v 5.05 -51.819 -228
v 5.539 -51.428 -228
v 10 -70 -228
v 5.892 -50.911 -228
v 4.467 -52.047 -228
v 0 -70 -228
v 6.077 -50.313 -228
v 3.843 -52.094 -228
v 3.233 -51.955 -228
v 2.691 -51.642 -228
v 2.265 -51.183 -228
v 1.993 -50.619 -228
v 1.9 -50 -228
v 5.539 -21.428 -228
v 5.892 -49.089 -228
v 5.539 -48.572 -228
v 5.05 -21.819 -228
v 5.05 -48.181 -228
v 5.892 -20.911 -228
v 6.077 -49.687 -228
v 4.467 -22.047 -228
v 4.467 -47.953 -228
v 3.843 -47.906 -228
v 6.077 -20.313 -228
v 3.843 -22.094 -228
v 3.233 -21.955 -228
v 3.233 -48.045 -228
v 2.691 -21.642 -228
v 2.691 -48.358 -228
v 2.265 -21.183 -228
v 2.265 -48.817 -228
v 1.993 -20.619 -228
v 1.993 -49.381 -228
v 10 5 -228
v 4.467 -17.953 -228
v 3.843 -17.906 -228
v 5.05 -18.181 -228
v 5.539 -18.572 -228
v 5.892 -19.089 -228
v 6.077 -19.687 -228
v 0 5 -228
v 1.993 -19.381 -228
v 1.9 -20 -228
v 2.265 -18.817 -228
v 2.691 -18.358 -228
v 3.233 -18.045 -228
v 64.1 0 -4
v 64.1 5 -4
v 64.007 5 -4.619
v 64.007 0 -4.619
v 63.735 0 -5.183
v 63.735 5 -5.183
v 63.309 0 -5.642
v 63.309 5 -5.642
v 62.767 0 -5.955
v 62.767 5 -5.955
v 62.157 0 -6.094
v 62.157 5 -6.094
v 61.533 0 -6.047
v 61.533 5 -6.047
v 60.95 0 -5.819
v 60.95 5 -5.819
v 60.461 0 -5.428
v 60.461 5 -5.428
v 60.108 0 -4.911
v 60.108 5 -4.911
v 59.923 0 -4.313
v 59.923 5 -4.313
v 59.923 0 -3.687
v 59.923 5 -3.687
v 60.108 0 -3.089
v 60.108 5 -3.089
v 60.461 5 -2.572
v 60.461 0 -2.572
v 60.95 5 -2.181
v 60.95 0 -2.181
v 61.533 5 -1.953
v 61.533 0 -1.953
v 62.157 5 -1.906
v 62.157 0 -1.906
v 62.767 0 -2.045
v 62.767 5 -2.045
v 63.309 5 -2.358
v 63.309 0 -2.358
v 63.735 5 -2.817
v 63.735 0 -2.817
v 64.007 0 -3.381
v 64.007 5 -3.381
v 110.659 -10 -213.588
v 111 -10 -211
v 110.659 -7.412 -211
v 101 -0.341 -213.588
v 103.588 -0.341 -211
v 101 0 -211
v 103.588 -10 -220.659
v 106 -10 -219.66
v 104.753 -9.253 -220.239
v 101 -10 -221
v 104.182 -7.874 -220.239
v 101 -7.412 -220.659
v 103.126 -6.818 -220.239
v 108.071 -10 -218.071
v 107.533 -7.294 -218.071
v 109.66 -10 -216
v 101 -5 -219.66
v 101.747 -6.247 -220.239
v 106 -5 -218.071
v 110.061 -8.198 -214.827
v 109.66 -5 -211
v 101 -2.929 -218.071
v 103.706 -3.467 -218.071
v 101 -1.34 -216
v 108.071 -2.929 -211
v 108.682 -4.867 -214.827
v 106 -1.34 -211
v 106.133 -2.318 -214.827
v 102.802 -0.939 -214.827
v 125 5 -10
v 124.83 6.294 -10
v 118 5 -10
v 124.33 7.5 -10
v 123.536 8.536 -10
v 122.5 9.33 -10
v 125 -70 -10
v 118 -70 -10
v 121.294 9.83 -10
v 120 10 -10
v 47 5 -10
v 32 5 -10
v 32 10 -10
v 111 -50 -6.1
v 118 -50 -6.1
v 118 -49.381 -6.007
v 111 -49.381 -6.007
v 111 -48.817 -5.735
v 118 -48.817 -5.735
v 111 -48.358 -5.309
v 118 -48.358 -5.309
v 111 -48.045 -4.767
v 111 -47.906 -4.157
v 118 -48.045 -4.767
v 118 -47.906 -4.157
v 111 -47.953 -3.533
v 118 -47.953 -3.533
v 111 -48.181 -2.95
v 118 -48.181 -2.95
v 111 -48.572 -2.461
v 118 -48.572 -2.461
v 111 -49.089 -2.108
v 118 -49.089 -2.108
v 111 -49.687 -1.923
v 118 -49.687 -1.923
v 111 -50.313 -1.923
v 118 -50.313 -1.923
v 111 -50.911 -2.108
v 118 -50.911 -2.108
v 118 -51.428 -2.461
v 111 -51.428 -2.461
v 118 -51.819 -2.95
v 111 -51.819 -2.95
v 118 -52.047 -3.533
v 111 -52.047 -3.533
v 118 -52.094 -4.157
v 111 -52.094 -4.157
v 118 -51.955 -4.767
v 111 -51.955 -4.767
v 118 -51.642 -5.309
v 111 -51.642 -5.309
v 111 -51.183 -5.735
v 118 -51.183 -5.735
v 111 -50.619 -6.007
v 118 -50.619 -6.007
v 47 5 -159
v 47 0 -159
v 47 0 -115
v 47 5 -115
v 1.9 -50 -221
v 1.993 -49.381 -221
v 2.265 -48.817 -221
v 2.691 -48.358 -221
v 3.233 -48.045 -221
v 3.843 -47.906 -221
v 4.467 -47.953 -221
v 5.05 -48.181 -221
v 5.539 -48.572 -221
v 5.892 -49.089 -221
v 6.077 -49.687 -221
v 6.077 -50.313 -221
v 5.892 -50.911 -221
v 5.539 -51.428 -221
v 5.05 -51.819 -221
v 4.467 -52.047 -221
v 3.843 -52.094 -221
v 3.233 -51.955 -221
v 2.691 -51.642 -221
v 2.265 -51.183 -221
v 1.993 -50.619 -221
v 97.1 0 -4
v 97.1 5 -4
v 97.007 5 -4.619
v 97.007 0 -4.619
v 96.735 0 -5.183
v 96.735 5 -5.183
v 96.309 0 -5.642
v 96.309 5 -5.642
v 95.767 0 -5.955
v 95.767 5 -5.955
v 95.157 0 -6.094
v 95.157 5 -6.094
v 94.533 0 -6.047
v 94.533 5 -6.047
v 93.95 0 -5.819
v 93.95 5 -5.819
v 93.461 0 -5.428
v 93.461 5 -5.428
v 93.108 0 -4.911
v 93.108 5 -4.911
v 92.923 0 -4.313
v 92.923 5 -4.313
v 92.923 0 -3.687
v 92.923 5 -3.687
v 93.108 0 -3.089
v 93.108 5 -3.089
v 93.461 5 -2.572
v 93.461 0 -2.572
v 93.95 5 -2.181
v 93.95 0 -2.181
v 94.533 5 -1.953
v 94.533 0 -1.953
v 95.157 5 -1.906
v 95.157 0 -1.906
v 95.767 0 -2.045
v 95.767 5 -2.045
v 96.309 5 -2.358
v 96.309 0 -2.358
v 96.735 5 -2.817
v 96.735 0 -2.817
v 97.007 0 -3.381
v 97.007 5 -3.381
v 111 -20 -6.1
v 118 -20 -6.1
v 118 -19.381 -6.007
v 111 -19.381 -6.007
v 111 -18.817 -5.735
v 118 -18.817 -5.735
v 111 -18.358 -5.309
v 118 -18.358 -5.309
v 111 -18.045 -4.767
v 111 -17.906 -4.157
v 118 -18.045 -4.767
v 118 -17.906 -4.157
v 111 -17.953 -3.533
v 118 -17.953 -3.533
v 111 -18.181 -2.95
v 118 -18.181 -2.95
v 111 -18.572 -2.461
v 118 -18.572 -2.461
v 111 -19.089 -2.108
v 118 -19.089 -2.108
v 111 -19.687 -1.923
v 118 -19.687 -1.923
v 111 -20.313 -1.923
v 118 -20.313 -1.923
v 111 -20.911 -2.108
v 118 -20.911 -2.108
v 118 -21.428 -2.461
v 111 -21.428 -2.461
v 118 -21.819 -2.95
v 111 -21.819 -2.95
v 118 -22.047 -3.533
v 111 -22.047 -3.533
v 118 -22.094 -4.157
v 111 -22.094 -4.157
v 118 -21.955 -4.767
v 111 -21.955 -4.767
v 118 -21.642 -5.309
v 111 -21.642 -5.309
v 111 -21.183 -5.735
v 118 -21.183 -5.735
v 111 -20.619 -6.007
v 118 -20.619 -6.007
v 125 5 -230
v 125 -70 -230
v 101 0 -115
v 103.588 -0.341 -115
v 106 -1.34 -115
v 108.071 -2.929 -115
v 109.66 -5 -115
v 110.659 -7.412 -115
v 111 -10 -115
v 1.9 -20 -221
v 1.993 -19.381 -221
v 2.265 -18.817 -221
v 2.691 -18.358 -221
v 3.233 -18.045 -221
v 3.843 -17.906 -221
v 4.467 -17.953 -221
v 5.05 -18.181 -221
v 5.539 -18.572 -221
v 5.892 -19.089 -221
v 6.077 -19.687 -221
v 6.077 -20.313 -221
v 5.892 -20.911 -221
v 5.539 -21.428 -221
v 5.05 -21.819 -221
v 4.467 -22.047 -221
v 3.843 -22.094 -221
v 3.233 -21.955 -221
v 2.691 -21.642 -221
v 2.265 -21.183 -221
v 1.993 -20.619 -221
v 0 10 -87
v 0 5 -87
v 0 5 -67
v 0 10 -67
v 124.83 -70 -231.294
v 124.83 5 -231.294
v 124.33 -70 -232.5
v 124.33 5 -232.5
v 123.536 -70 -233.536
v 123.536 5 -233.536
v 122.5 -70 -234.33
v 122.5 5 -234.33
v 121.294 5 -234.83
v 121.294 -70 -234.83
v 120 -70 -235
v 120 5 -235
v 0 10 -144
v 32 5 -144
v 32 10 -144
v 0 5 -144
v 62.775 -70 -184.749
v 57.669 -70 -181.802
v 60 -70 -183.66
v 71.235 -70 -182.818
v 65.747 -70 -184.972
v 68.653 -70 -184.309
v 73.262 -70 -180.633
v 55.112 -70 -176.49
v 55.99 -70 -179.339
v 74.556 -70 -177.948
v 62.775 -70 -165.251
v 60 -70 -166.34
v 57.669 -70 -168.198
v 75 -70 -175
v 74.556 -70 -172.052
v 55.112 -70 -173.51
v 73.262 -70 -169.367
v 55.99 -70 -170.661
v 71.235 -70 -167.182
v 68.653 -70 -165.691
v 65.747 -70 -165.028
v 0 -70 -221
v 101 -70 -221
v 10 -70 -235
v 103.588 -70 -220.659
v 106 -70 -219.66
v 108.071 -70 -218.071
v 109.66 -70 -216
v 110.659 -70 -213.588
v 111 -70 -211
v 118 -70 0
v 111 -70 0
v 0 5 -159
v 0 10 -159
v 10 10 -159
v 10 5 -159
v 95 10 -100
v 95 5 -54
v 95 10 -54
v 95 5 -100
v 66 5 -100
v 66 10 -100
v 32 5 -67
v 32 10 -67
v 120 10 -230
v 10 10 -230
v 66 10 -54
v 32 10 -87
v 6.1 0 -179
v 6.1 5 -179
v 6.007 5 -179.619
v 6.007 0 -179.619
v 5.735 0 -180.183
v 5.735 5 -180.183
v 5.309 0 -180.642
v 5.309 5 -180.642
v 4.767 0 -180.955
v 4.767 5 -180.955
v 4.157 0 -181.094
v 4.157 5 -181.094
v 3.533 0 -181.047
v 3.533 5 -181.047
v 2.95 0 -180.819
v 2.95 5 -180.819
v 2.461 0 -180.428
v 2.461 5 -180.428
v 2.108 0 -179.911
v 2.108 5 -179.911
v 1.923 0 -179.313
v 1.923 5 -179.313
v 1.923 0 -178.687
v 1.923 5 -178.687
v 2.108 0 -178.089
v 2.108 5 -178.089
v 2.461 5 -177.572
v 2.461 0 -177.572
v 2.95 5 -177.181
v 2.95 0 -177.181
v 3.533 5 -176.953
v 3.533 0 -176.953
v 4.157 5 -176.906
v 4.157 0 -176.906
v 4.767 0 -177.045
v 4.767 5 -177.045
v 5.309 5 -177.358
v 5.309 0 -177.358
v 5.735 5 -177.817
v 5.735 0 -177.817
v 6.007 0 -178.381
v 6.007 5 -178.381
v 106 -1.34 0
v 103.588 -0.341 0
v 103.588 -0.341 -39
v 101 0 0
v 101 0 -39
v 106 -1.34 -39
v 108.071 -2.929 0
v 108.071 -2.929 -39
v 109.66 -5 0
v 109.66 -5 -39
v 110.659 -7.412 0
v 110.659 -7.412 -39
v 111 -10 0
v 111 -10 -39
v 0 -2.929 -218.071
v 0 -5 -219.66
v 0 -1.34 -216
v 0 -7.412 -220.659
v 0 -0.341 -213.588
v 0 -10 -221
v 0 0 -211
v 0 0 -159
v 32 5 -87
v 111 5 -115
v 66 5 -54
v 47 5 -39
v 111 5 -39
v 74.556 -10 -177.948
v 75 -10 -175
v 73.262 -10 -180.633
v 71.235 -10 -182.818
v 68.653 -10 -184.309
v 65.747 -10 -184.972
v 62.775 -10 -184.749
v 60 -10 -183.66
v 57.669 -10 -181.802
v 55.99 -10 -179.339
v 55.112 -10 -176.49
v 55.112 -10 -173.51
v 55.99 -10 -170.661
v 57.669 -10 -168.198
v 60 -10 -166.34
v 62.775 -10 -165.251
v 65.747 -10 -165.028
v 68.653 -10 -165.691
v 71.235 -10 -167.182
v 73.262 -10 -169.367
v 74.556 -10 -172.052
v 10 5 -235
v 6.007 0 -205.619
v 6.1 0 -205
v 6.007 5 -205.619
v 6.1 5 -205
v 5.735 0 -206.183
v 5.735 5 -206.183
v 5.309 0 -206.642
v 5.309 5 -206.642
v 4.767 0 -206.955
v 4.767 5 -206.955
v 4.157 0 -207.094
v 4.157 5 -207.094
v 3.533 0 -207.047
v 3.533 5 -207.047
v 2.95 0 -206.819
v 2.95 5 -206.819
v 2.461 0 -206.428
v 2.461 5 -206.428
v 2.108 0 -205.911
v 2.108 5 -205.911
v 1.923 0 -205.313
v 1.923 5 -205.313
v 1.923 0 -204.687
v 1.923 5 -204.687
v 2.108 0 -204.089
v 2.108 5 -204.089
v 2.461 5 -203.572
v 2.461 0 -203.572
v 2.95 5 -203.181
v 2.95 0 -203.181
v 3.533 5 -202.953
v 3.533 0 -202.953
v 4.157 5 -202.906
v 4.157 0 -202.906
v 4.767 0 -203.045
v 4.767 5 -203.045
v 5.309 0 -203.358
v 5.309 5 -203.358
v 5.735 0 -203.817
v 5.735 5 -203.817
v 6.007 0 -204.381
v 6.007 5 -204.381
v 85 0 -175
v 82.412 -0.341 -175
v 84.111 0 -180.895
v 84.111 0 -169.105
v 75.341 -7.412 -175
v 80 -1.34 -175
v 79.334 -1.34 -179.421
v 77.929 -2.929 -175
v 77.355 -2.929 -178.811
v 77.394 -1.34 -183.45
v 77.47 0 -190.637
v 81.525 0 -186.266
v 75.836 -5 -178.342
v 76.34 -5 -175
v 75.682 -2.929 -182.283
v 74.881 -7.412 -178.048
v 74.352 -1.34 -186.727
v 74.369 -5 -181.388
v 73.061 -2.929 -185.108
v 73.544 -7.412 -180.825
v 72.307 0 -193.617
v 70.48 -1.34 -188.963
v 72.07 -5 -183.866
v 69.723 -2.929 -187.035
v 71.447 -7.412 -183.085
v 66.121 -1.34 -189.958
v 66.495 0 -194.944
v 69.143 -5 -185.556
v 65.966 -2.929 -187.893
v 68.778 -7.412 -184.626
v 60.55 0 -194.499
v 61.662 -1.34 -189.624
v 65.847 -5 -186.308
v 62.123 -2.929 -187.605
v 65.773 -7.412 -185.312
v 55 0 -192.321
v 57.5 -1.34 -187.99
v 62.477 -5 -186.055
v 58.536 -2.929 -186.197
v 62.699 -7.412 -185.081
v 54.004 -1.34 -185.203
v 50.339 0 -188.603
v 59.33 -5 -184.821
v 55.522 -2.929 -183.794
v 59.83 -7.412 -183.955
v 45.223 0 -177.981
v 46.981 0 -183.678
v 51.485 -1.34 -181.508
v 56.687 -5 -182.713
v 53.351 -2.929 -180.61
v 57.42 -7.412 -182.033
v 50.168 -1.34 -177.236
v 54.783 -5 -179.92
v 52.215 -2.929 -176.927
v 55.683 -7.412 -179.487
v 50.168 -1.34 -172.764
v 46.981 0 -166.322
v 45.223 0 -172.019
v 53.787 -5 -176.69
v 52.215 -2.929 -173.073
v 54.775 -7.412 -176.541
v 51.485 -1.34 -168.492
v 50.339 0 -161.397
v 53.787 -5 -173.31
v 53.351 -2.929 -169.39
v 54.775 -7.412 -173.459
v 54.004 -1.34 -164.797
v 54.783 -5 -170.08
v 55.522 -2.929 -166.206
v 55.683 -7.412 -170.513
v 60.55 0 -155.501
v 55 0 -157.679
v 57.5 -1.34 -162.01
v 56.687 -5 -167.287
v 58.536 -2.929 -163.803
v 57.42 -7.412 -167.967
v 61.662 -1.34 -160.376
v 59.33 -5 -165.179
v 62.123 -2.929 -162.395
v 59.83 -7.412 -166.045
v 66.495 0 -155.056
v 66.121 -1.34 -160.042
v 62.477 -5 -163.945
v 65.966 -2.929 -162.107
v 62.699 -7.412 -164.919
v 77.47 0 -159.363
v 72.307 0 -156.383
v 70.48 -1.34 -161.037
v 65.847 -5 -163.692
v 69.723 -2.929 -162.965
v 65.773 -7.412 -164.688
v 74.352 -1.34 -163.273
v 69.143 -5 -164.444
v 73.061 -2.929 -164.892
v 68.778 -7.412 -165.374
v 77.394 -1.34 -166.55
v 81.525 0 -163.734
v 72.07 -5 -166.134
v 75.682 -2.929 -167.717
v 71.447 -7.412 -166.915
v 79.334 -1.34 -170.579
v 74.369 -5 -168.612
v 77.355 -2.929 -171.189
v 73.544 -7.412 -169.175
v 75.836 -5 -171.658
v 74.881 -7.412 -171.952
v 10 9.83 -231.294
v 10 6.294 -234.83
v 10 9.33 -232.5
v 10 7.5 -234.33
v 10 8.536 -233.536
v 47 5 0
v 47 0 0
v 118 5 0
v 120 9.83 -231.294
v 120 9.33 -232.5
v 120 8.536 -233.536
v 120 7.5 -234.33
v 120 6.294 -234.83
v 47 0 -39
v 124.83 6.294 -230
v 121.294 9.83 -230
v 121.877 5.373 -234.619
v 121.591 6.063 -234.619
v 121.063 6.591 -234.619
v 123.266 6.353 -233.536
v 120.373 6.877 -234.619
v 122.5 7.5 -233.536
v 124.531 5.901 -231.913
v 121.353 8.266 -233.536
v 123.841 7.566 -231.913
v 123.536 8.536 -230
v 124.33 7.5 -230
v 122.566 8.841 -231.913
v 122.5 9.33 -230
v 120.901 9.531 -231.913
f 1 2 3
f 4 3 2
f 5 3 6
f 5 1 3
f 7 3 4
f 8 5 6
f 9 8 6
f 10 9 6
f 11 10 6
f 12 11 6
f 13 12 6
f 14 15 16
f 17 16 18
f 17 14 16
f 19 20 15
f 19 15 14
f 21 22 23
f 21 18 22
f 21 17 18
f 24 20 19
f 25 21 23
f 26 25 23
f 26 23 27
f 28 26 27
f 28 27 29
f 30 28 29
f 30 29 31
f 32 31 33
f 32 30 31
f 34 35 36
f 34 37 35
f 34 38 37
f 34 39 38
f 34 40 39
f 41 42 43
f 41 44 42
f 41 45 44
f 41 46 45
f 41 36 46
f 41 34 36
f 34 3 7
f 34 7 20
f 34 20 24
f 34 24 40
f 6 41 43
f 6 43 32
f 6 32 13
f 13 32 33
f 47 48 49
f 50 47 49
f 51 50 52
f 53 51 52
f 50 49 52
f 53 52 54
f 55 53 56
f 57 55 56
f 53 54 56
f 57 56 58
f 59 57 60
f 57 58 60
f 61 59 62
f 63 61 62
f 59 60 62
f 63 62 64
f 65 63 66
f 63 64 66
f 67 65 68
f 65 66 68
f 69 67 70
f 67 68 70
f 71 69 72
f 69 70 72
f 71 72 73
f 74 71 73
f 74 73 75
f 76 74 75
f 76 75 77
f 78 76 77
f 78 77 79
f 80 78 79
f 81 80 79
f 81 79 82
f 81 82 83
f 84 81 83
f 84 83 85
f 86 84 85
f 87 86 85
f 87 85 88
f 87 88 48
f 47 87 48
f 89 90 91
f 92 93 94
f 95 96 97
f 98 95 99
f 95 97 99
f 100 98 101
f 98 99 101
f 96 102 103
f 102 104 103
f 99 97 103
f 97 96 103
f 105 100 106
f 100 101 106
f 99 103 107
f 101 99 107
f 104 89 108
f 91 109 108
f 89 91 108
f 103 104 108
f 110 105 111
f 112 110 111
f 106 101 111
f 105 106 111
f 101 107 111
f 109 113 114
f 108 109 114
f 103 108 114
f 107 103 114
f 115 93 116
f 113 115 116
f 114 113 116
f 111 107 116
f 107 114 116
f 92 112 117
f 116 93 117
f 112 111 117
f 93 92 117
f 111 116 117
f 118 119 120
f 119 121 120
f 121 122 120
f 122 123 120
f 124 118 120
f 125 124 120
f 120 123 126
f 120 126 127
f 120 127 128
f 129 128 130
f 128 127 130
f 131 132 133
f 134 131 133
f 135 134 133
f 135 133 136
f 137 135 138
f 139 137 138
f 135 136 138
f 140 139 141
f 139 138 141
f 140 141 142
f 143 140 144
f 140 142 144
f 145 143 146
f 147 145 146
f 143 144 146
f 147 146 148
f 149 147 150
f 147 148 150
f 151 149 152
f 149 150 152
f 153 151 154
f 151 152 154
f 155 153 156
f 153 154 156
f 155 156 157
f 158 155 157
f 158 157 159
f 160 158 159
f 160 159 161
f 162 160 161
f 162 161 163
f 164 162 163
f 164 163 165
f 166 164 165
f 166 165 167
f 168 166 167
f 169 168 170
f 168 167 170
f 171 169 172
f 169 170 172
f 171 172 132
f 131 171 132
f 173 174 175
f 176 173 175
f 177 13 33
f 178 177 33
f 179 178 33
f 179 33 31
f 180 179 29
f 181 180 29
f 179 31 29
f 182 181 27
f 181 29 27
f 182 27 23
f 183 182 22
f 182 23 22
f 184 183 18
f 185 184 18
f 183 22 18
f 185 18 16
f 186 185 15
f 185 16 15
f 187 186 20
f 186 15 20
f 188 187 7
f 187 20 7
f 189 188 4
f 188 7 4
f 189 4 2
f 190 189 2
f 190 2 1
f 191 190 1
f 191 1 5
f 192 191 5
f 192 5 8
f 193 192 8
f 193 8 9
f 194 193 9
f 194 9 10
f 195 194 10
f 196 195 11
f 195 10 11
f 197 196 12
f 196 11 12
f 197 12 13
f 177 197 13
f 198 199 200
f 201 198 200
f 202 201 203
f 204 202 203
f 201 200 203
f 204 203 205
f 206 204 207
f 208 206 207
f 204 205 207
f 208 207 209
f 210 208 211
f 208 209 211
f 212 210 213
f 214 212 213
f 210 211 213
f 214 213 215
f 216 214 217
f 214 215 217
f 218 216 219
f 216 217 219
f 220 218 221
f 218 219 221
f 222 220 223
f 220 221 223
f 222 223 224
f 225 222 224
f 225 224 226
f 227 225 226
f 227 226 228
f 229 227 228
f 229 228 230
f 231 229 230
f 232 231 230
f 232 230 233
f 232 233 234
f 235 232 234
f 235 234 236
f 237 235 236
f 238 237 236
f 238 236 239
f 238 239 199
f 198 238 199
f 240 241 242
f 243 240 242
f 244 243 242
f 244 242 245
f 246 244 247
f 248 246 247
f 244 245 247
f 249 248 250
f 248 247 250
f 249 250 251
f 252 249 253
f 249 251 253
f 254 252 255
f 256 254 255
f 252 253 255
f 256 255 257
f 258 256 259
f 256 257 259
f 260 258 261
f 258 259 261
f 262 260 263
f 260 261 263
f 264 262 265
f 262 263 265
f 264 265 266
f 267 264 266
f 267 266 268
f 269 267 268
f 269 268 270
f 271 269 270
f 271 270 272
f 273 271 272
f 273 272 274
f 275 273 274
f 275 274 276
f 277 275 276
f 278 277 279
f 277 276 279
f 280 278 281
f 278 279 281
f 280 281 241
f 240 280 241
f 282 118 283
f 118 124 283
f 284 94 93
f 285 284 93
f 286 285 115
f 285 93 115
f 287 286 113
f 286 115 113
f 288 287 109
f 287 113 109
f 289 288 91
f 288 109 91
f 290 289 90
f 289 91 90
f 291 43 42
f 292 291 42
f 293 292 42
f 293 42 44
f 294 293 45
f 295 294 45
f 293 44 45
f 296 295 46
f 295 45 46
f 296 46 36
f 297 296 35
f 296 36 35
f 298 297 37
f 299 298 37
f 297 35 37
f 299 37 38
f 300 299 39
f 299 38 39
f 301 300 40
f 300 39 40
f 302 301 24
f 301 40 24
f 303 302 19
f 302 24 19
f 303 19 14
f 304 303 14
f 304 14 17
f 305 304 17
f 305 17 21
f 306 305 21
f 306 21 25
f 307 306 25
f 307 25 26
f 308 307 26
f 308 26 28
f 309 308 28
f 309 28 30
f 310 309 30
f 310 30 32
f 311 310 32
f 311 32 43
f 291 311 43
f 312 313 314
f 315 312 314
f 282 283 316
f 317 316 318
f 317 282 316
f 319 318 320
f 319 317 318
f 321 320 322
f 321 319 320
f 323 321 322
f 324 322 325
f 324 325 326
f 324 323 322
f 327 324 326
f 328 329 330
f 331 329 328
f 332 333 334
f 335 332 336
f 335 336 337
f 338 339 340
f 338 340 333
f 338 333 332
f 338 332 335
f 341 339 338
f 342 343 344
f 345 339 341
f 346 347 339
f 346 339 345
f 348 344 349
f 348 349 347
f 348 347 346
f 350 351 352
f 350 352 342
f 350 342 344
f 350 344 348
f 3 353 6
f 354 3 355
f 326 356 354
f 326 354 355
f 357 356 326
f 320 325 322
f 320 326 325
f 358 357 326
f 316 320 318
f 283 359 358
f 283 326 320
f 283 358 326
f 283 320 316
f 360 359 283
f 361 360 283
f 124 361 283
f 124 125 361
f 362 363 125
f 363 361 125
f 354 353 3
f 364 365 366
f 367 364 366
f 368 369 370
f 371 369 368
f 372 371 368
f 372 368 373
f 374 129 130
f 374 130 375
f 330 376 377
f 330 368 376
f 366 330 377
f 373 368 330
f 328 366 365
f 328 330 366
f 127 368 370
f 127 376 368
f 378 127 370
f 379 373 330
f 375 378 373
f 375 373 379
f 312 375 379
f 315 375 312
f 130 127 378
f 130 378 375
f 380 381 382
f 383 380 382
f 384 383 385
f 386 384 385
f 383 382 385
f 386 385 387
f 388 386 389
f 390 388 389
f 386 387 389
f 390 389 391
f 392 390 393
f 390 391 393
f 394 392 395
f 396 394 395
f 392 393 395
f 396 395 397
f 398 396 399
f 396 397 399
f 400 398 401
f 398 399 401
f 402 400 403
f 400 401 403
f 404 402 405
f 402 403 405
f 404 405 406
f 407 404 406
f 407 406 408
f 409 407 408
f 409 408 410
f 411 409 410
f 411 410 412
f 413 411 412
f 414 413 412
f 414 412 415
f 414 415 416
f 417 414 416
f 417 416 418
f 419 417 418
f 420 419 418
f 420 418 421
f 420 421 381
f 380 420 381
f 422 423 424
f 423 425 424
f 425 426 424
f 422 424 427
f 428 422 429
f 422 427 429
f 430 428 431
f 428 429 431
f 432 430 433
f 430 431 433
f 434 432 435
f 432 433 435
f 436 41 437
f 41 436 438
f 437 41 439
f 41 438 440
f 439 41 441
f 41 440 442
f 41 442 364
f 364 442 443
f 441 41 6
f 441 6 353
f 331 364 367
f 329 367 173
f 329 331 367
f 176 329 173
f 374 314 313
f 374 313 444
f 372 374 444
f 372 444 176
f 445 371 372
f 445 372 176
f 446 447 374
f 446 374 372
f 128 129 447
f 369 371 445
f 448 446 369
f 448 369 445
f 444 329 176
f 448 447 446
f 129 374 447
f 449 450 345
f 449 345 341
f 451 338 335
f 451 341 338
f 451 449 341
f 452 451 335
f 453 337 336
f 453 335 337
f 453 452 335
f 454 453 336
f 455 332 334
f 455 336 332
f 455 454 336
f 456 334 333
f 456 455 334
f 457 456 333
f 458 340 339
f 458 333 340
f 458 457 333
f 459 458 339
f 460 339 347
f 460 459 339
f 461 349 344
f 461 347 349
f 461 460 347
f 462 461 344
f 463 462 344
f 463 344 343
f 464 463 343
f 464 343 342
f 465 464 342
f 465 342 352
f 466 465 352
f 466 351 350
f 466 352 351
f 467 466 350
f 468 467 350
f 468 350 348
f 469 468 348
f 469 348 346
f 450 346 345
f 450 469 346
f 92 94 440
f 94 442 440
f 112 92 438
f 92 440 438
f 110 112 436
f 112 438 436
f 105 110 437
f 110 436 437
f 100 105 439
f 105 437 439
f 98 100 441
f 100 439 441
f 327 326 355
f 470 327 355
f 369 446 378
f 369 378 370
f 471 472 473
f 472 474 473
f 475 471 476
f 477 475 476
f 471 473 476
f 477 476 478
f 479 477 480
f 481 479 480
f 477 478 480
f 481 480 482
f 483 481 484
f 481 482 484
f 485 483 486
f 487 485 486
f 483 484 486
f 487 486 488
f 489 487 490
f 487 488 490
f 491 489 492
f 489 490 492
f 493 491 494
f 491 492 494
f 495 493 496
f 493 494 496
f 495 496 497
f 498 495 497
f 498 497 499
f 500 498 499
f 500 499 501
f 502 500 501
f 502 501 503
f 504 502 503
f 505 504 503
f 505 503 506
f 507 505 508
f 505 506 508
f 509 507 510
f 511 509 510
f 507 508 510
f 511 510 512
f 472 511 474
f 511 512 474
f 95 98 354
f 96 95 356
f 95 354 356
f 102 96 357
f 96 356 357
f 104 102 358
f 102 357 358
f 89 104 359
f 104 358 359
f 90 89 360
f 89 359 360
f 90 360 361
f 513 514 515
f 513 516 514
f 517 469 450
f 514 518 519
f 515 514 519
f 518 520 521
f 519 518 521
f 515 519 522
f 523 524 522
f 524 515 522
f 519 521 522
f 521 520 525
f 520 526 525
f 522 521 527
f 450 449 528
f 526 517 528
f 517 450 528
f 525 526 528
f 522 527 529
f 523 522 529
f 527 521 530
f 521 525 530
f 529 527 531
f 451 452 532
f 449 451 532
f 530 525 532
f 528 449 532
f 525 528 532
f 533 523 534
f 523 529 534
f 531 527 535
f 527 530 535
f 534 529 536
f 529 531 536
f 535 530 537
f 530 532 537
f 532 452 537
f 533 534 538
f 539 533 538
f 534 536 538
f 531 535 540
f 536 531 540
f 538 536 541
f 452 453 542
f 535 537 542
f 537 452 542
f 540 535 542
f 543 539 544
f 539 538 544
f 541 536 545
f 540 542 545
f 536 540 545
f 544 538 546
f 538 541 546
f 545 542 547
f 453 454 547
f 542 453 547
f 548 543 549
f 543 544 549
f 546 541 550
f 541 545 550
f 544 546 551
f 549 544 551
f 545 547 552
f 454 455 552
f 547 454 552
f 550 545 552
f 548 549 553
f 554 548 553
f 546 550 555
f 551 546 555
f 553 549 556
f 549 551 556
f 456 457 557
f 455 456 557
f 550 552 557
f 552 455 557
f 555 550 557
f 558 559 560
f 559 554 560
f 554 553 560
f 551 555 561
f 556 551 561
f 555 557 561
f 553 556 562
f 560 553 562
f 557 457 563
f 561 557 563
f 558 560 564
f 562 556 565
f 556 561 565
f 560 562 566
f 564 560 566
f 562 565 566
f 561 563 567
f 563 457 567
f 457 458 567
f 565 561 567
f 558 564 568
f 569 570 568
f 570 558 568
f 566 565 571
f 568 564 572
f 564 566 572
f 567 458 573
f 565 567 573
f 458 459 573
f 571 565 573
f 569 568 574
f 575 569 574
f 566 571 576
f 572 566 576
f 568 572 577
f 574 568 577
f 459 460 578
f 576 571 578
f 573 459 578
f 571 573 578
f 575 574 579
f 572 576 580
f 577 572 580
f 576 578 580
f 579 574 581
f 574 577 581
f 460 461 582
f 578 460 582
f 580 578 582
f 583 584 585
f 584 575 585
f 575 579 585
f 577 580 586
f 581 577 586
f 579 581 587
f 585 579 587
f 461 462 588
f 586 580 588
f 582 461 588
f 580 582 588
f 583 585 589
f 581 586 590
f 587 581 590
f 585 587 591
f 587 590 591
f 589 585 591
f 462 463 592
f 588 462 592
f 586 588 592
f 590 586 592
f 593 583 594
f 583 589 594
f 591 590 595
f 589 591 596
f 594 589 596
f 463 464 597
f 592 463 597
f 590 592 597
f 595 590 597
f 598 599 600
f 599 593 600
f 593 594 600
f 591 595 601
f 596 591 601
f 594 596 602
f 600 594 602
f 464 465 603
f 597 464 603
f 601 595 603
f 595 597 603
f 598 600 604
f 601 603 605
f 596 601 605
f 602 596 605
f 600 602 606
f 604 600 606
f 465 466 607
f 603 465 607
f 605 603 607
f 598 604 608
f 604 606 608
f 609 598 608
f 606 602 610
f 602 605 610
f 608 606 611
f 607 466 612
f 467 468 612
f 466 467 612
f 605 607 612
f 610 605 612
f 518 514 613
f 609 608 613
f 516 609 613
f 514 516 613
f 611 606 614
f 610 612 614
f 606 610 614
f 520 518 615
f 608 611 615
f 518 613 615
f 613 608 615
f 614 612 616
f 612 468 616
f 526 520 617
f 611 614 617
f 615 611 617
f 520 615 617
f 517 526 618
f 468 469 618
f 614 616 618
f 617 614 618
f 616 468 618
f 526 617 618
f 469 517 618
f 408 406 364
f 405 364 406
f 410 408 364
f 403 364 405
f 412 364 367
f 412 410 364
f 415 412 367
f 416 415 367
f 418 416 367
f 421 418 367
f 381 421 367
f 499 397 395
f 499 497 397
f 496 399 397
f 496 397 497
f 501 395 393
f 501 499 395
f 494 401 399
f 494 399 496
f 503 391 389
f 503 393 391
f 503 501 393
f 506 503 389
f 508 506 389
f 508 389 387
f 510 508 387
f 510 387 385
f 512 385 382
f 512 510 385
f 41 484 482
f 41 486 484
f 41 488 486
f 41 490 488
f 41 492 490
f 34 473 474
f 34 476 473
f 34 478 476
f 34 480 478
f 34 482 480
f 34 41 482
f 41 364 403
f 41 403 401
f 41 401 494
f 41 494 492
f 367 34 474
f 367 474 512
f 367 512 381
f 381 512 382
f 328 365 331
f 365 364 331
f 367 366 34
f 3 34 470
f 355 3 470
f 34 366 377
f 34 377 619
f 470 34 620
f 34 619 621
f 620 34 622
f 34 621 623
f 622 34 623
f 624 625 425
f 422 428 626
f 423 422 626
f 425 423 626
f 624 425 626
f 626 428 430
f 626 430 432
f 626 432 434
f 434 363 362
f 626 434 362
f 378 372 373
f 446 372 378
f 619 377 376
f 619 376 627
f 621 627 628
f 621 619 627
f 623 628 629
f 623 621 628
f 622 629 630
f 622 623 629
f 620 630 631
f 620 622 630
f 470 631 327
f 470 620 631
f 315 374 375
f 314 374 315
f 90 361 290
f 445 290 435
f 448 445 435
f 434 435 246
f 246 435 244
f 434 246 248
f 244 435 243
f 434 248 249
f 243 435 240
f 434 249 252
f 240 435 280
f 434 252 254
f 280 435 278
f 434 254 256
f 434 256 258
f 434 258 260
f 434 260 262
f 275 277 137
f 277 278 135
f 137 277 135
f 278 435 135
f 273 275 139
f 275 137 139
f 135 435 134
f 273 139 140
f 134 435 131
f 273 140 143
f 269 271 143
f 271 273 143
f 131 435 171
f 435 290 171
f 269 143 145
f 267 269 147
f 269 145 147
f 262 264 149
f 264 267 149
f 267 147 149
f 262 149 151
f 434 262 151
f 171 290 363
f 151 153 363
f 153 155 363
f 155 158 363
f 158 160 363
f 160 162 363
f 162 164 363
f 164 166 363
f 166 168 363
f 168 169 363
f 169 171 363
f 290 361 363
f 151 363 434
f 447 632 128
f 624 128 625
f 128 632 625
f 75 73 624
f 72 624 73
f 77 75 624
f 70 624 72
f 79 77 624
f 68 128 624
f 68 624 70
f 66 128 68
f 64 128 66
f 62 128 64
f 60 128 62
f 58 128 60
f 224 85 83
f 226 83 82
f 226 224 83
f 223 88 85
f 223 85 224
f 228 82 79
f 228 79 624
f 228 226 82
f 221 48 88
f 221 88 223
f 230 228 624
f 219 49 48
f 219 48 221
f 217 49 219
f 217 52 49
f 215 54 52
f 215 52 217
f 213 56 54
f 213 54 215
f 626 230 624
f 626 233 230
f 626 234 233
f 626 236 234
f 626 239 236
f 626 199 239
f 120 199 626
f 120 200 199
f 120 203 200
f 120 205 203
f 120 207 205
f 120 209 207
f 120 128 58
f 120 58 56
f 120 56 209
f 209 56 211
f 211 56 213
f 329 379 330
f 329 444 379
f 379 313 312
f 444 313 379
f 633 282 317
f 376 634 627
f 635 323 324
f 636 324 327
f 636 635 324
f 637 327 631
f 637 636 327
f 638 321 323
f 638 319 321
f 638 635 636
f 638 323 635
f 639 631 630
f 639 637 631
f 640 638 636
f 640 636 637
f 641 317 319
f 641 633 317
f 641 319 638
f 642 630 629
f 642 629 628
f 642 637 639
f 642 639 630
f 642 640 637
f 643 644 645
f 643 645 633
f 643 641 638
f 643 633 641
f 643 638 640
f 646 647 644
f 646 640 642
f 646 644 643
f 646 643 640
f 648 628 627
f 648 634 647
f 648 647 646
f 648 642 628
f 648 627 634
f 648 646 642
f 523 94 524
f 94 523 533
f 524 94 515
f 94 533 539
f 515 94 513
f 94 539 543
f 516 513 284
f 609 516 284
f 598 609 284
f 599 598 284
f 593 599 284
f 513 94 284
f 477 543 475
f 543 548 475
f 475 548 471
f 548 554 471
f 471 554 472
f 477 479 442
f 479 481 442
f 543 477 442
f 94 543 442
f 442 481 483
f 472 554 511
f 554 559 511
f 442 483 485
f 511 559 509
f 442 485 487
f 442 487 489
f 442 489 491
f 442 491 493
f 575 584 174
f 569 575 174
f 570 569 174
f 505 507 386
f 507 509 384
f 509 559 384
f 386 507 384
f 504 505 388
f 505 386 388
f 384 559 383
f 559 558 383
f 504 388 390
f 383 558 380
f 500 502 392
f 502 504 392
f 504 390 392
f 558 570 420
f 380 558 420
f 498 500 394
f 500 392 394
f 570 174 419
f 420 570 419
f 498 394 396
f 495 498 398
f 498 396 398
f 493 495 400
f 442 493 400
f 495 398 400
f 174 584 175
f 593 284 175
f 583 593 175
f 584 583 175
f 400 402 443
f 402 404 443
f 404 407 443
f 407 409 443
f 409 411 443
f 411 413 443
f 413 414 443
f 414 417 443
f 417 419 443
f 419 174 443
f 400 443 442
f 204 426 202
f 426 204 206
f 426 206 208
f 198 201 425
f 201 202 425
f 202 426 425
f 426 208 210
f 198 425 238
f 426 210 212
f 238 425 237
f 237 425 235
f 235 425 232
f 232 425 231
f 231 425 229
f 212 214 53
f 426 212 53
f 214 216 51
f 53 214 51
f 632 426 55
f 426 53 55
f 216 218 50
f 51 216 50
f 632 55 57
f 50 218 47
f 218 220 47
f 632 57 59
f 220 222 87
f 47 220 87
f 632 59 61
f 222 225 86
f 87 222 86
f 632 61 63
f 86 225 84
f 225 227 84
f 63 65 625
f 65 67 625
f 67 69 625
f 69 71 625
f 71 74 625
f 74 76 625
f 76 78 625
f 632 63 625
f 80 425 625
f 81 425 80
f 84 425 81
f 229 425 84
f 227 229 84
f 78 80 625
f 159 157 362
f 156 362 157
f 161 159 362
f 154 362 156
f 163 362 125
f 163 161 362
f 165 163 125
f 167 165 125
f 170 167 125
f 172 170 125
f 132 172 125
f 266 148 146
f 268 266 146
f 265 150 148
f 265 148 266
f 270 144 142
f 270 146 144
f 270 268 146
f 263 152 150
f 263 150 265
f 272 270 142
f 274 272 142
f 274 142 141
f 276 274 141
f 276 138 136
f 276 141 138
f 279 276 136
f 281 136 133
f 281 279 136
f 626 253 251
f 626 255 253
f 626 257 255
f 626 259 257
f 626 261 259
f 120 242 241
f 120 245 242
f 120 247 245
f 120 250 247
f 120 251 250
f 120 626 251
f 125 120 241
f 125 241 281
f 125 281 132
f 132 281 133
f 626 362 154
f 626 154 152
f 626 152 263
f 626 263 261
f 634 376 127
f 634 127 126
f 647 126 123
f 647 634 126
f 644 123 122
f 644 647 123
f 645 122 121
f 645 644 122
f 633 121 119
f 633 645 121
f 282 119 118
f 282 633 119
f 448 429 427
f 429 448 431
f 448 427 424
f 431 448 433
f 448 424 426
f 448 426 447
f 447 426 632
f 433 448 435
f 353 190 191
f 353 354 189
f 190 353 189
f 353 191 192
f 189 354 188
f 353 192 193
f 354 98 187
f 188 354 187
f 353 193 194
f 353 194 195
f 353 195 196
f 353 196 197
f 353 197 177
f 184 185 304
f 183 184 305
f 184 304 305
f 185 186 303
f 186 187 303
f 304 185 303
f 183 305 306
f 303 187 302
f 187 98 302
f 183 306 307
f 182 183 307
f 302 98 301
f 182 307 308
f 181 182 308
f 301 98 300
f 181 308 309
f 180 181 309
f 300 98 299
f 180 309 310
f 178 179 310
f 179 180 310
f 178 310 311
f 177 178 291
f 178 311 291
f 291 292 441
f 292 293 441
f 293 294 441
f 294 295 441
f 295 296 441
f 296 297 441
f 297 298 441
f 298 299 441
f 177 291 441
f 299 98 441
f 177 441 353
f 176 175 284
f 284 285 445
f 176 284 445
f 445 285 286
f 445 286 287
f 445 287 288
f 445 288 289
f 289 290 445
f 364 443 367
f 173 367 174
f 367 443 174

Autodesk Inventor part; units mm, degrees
ref_plane "YZ Plane" through (0, 0, 0) normal (1, 0, 0) x (0, 1, 0)
ref_plane "XZ Plane" through (0, 0, 0) normal (0, 1, 0) x (-1, 0, 0)
ref_plane "XY Plane" through (0, 0, 0) normal (0, 0, 1) x (1, 0, 0)
sketch "草图7" plane through (0, 0, 0) normal (0, 1, 0) x (-1, 0, 0)
  line L0 (125, 235) -> (-125, 235)
  line L1 (-125, 235) -> (-125, -235)
  line L2 (-125, -235) -> (125, -235)
  line L3 (125, -235) -> (125, 235)
  line L4 (0, 3) -> (0, -5)
  line L5 (3.5058, 0) -> (-3.4421, 0)
  line L6 (25, 144) -> (-32, 144)
  line L7 (-32, 144) -> (-32, 87)
  line L8 (-32, 87) -> (25, 87)
  line L9 (25, 87) -> (25, 144)
  line L10 (25, 67) -> (-32, 67)
  line L11 (-32, 67) -> (-32, 10)
  line L12 (-32, 10) -> (25, 10)
  line L13 (25, 10) -> (25, 67)
  line L14 (25, -10) -> (-32, -10)
  line L15 (-32, -10) -> (-32, -67)
  line L16 (-32, -67) -> (25, -67)
  line L17 (25, -67) -> (25, -10)
  line L18 (25, -87) -> (-32, -87)
  line L19 (-32, -87) -> (-32, -144)
  line L20 (-32, -144) -> (25, -144)
  line L21 (25, -144) -> (25, -87)
  line L22 (-66, 100) -> (-95, 100)
  line L23 (-95, 100) -> (-95, 54)
  line L24 (-95, 54) -> (-66, 54)
  line L25 (-66, 54) -> (-66, 100)
  line L26 (-66, -54) -> (-95, -54)
  line L27 (-95, -54) -> (-95, -100)
  line L28 (-95, -100) -> (-66, -100)
  line L29 (-66, -100) -> (-66, -54)
  line L30 (100, 15) -> (70, 15)
  line L31 (70, 15) -> (70, -15)
  line L32 (70, -15) -> (100, -15)
  line L33 (100, -15) -> (100, 15)
  circle A0 centre (65, 182) radius 10
  circle A1 centre (65, -182) radius 10
  circle A2 centre (65, 182) radius 15
  circle A3 centre (80, 182) radius 1.5
  circle A4 centre (57.5, 194.9904) radius 1.5
  circle A5 centre (57.5, 169.0096) radius 1.5
  line L34 (125, 235) -> (0, 235)
  line L35 (0, 235) -> (0, 0)
  line L36 (0, 0) -> (125, 0)
  line L37 (125, 0) -> (125, 235)
  line L38 (-125, 235) -> (0, 235)
  line L39 (0, 235) -> (0, 0)
  line L40 (0, 0) -> (-125, 0)
  line L41 (-125, 0) -> (-125, 235)
  line L42 (-125, -235) -> (0, -235)
  line L43 (0, -235) -> (0, 0)
  line L44 (0, 0) -> (-125, 0)
  line L45 (-125, 0) -> (-125, -235)
  line L46 (125, -235) -> (0, -235)
  line L47 (0, -235) -> (0, 0)
  line L48 (0, 0) -> (125, 0)
  line L49 (125, 0) -> (125, -235)
  circle A6 centre (65, -182) radius 15
  circle A7 centre (80, -182) radius 1.5
  circle A8 centre (57.5, -169.0096) radius 1.5
  circle A9 centre (57.5, -194.9904) radius 1.5
  point P0 (0, -87)
  point P1 (0, -67)
  point P2 (0, -10)
  point P3 (0, -235)
  point P4 (0, -144)
  dimension "d115" = 30
  dimension "d118" = 30
  dimension "d84" = 470
  dimension "d85" = 250
  dimension "d86" = 57
  dimension "d87" = 57
  dimension "d88" = 57
  dimension "d89" = 57
  dimension "d90" = 57
  dimension "d91" = 57
  dimension "d92" = 57
  dimension "d93" = 57
  dimension "d94" = 91
  dimension "d95" = 20
  dimension "d96" = 20
  dimension "d97" = 20
  dimension "d98" = 93
  dimension "d99" = 29
  dimension "d100" = 46
  dimension "d101" = 46
  dimension "d102" = 135
  dimension "d103" = 108
  dimension "d104" = 30
  dimension "d105" = 30
  dimension "d106" = 30
  dimension "d107" = 25
  dimension "d108" = 220
  dimension "d109" = 20
  dimension "d110" = 53
  dimension "d111" = 60
  dimension "d112" = 20
  dimension "d113" = 53
  dimension "d114" = 60
  dimension "d116" = 3
  dimension "d117" = 360
  dimension "d119" = 3
  dimension "d120" = 360
extrude "拉伸7" add sketch "草图7" along normal blind 10 contours L40 L5 L4 L43 L14 L15 L16 L18 L19 L20 L2 L1
sketch "草图8" plane through (0, 0, 0) normal (0, -1, 0) x (1, 0, 0)
  line L0 (0, 0) -> (125, 0) projected
  line L1 (0, -235) -> (0, -144) projected
  line L2 (47, 0) -> (0, 0)
  line L3 (0, 0) -> (0, -159)
  line L4 (0, -159) -> (47, -159)
  line L5 (47, -159) -> (47, 0)
  line L6 (32, -67) -> (32, -10) projected
  line L7 (0, -144) -> (32, -144) projected
  line L8 (111, -39) -> (47, -39)
  line L9 (47, -39) -> (47, -115)
  line L10 (47, -115) -> (111, -115)
  line L11 (111, -115) -> (111, -39)
  line L12 (95, -54) -> (66, -54) projected
  line L13 (66, -100) -> (95, -100) projected
  line L14 (95, -100) -> (95, -54) projected
  line L15 (66, -54) -> (66, -100) projected
  dimension "d123" = 15
  dimension "d124" = 15
  dimension "d125" = 15
  dimension "d126" = 15
  dimension "d127" = 16
  dimension "d128" = 19
extrude "拉伸8" cut sketch "草图8" against normal blind 5
sketch "草图9" plane through (0, 0, 0) normal (0, -1, 0) x (1, 0, 0)
  line L0 (125, -235) -> (0, -235) projected
  line L1 (125, 0) -> (111, 0)
  line L2 (111, 0) -> (111, -235)
  line L3 (111, -235) -> (125, -235)
  line L4 (125, -235) -> (125, 0)
  line L5 (0, -235) -> (0, -159) projected
  line L6 (125, 0) -> (125, -235) projected
  line L7 (0, -235) -> (125, -235)
  line L8 (125, -235) -> (125, -221)
  line L9 (125, -221) -> (0, -221)
  line L10 (0, -221) -> (0, -235)
  point P0 (0, 0)
  point P1 (111, -221)
  dimension "d131" = 14
  dimension "d132" = 14
extrude "拉伸9" add sketch "草图9" along normal blind 70
sketch "草图10" plane through (0, 10, 0) normal (0, 1, 0) x (1, 0, 0)
  line L0 (0, 221) -> (0, 159) projected
  line L1 (125, 235) -> (0, 235) projected
  line L2 (0, 159) -> (10, 159)
  line L3 (10, 159) -> (10, 235)
  line L4 (10, 235) -> (0, 235)
  line L5 (0, 235) -> (0, 159)
  point P0 (0, 0)
  dimension "d135" = 10
extrude "拉伸10" cut sketch "草图10" against normal blind 5
sketch "草图11" plane through (0, 5, 0) normal (0, 1, 0) x (1, 0, 0)
  circle A0 centre (4, 179) radius 2.1
  circle A1 centre (4, 205) radius 2.1
  line L0 (0, 159) -> (0, 235) projected
  line L1 (10, 159) -> (0, 159) projected
  line L2 (125, 235) -> (10, 235) projected
  point P0 (0, 0)
  dimension "d138" = 4.2
  dimension "d139" = 4.2
  dimension "d140" = 4
  dimension "d141" = 4
  dimension "d142" = 20
  dimension "d143" = 30
extrude "拉伸11" cut sketch "草图11" against normal blind 5
sketch "草图12" plane through (125, -70, -235) normal (0, 0, -1) x (-1, 0, 0)
  line L0 (125, 0) -> (125, 75) projected
  line L1 (14, 0) -> (125, 0) projected
  line L2 (125, 75) -> (115, 75)
  line L3 (115, 75) -> (115, 0)
  line L4 (115, 0) -> (125, 0)
  line L5 (125, 0) -> (125, 75)
  point P0 (125, 70)
  dimension "d146" = 10
extrude "拉伸12" cut sketch "草图12" against normal blind 7
sketch "草图13" plane through (125, -70, -228) normal (0, 0, -1) x (-1, 0, 0)
  circle A0 centre (121, 50) radius 2.1
  circle A1 centre (121, 20) radius 2.1
  line L0 (125, 75) -> (125, 0) projected
  line L1 (115, 0) -> (0, 0) projected
  line L2 (0, 80) -> (115, 80) projected
  point P0 (125, 70)
  dimension "d149" = 4.2
  dimension "d150" = 4.2
  dimension "d151" = 4
  dimension "d152" = 4
  dimension "d153" = 20
  dimension "d154" = 30
extrude "拉伸13" cut sketch "草图13" against normal blind 7
fillet "圆角2" radius 10 4 edges at (111, 0, -19.5) (111, 0, -168) (55.5, 0, -221) (111, -35, -221)
sketch "草图14" plane through (0, 0, 0) normal (0, -1, 0) x (1, 0, 0)
  circle A0 centre (65, -175) radius 10
  line L0 (125, -235) -> (125, 0) projected
  line L1 (10, -235) -> (125, -235) projected
  point P0 (0, 0)
  point P1 (125, -230)
  point P2 (120, -235)
  dimension "d159" = 20
  dimension "d160" = 60
  dimension "d161" = 60
extrude "拉伸14" add sketch "草图14" along normal blind 70
fillet "圆角3" radius 10 1 edges at (55, 0, -175)
sketch "草图16" plane through (0, 10, 0) normal (0, 1, 0) x (1, 0, 0)
  line L0 (125, 0) -> (125, 235) projected
  line L1 (0, 0) -> (125, 0)
  line L2 (125, 0) -> (125, 10)
  line L3 (125, 10) -> (0, 10)
  line L4 (0, 10) -> (0, 0)
  dimension "d167" = 10
extrude "拉伸16" cut sketch "草图16" against normal blind 5
sketch "草图17" plane through (0, 5, 0) normal (0, 1, 0) x (1, 0, 0)
  circle A0 centre (62, 4) radius 2.1
  circle A1 centre (95, 4) radius 2.1
  line L0 (125, 0) -> (47, 0) projected
  line L1 (32, 67) -> (32, 10) projected
  line L2 (125, 10) -> (125, 235) projected
  point P0 (0, 0)
  dimension "d170" = 4.2
  dimension "d171" = 4.2
  dimension "d172" = 4
  dimension "d173" = 4
  dimension "d174" = 30
  dimension "d175" = 30
extrude "拉伸17" cut sketch "草图17" against normal blind 5
sketch "草图18" plane through (125, -70, -235) normal (1, 0, 0) x (0, 0, -1)
  line L0 (-235, 60) -> (-235, 0) projected
  line L1 (-225, 75) -> (-235, 75)
  line L2 (-235, 75) -> (-235, 0)
  line L3 (-235, 0) -> (-225, 0)
  line L4 (-225, 0) -> (-225, 75)
  point P0 (-235, 70)
extrude "拉伸18" cut sketch "草图18" against normal blind 7
sketch "草图19" plane through (118, -70, -235) normal (1, 0, 0) x (0, 0, -1)
  circle A0 centre (-231, 50) radius 2.1
  circle A1 centre (-231, 20) radius 2.1
  line L0 (-235, 0) -> (-235, 75) projected
  line L1 (0, 0) -> (-225, 0) projected
  line L2 (-225, 80) -> (0, 80) projected
  point P0 (-235, 70)
  dimension "d180" = 4.2
  dimension "d181" = 4.2
  dimension "d182" = 4
  dimension "d183" = 4
  dimension "d184" = 20
  dimension "d185" = 30
extrude "拉伸19" cut sketch "草图19" against normal blind 7
fillet "圆角4" radius 5 3 edges at (125, 10, -122.5) (67.5, 10, -235) (125, -30, -235)
properties part number "top_4"
